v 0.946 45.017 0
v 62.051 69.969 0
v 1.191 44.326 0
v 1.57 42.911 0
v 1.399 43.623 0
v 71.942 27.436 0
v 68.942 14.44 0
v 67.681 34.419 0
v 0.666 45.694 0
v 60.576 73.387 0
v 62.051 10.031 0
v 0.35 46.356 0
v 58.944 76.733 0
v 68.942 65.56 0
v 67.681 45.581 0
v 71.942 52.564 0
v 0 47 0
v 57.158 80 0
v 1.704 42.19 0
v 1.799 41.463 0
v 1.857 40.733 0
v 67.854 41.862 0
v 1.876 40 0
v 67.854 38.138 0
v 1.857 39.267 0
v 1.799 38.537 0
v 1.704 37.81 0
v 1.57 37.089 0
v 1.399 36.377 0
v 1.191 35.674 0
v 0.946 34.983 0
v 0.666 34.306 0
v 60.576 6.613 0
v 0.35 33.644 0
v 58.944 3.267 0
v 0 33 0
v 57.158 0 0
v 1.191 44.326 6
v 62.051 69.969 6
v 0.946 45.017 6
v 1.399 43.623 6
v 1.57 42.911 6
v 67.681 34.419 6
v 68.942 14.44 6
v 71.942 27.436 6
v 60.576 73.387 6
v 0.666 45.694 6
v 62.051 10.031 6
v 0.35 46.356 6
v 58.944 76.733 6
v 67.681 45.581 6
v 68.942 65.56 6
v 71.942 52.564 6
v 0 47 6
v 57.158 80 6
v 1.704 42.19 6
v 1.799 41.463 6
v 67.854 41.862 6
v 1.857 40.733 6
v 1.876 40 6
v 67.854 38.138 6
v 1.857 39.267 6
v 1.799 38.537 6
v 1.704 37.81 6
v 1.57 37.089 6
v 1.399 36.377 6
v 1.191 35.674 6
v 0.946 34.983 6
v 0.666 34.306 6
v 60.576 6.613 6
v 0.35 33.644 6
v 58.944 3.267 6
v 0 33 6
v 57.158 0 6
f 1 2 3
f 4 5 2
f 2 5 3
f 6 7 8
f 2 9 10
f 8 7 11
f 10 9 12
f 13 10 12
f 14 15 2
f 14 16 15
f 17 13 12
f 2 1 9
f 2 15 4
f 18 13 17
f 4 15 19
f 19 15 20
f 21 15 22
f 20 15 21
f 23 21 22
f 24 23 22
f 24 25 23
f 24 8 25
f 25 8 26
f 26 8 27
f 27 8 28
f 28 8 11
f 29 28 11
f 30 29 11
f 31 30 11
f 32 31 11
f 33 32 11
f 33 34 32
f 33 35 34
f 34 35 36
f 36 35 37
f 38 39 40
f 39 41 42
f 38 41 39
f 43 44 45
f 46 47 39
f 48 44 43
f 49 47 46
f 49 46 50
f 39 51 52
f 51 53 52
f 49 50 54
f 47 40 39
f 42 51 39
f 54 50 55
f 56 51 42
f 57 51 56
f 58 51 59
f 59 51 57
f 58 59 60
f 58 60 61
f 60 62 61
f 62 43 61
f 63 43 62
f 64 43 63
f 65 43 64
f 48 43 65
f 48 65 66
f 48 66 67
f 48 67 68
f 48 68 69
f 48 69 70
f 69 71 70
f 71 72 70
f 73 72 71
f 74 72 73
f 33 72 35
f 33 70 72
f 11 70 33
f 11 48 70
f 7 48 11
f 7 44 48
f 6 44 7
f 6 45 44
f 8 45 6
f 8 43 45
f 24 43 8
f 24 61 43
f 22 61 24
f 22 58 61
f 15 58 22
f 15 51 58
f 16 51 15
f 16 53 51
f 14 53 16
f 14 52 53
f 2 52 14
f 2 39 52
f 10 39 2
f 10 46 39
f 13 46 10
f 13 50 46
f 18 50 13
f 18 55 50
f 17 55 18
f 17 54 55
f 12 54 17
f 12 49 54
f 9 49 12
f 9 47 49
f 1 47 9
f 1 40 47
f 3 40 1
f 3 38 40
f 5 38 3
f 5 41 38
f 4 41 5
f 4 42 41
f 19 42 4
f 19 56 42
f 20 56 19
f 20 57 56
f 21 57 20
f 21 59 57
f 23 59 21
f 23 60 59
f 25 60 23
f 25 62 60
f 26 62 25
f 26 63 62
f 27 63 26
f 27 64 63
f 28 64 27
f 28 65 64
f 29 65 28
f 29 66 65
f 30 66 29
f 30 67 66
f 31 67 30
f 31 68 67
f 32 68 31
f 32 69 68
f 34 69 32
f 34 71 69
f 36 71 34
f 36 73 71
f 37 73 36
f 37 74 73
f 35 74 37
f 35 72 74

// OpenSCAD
$fn = 32;

// ----------------------------------------------------------------------
// Gear sector: 2 teeth on 60 degrees
// ----------------------------------------------------------------------

// --- parameters (mm) ---
sector_angle = 60;        // sector angle, degrees
root_r = 80;              // root circle radius
tooth_h = 5;              // tooth height over the root circle
teeth = 2;                // number of teeth on the sector
hub_r = 14;               // hub bore radius
plate_t = 6;              // sector thickness, Z
arc_step = 3;             // sampling step of the root/hub arcs, degrees

tip_r = root_r + tooth_h;  // tip circle radius

profile = [[57.158, 0], [58.944, 3.267], [60.576, 6.613], [62.051, 10.031], [68.942, 14.44], [71.942, 27.436], [67.681, 34.419], [67.854, 38.138], [67.854, 41.862], [67.681, 45.581], [71.942, 52.564], [68.942, 65.56], [62.051, 69.969], [60.576, 73.387], [58.944, 76.733], [57.158, 80], [0, 47], [0.35, 46.356], [0.666, 45.694], [0.946, 45.017], [1.191, 44.326], [1.399, 43.623], [1.57, 42.911], [1.704, 42.19], [1.799, 41.463], [1.857, 40.733], [1.876, 40], [1.857, 39.267], [1.799, 38.537], [1.704, 37.81], [1.57, 37.089], [1.399, 36.377], [1.191, 35.674], [0.946, 34.983], [0.666, 34.306], [0.35, 33.644], [0, 33]];  // primary outline, 37 points, counter clockwise

// --- the one profile operation ---
linear_extrude(height = plate_t) polygon(points = profile);
